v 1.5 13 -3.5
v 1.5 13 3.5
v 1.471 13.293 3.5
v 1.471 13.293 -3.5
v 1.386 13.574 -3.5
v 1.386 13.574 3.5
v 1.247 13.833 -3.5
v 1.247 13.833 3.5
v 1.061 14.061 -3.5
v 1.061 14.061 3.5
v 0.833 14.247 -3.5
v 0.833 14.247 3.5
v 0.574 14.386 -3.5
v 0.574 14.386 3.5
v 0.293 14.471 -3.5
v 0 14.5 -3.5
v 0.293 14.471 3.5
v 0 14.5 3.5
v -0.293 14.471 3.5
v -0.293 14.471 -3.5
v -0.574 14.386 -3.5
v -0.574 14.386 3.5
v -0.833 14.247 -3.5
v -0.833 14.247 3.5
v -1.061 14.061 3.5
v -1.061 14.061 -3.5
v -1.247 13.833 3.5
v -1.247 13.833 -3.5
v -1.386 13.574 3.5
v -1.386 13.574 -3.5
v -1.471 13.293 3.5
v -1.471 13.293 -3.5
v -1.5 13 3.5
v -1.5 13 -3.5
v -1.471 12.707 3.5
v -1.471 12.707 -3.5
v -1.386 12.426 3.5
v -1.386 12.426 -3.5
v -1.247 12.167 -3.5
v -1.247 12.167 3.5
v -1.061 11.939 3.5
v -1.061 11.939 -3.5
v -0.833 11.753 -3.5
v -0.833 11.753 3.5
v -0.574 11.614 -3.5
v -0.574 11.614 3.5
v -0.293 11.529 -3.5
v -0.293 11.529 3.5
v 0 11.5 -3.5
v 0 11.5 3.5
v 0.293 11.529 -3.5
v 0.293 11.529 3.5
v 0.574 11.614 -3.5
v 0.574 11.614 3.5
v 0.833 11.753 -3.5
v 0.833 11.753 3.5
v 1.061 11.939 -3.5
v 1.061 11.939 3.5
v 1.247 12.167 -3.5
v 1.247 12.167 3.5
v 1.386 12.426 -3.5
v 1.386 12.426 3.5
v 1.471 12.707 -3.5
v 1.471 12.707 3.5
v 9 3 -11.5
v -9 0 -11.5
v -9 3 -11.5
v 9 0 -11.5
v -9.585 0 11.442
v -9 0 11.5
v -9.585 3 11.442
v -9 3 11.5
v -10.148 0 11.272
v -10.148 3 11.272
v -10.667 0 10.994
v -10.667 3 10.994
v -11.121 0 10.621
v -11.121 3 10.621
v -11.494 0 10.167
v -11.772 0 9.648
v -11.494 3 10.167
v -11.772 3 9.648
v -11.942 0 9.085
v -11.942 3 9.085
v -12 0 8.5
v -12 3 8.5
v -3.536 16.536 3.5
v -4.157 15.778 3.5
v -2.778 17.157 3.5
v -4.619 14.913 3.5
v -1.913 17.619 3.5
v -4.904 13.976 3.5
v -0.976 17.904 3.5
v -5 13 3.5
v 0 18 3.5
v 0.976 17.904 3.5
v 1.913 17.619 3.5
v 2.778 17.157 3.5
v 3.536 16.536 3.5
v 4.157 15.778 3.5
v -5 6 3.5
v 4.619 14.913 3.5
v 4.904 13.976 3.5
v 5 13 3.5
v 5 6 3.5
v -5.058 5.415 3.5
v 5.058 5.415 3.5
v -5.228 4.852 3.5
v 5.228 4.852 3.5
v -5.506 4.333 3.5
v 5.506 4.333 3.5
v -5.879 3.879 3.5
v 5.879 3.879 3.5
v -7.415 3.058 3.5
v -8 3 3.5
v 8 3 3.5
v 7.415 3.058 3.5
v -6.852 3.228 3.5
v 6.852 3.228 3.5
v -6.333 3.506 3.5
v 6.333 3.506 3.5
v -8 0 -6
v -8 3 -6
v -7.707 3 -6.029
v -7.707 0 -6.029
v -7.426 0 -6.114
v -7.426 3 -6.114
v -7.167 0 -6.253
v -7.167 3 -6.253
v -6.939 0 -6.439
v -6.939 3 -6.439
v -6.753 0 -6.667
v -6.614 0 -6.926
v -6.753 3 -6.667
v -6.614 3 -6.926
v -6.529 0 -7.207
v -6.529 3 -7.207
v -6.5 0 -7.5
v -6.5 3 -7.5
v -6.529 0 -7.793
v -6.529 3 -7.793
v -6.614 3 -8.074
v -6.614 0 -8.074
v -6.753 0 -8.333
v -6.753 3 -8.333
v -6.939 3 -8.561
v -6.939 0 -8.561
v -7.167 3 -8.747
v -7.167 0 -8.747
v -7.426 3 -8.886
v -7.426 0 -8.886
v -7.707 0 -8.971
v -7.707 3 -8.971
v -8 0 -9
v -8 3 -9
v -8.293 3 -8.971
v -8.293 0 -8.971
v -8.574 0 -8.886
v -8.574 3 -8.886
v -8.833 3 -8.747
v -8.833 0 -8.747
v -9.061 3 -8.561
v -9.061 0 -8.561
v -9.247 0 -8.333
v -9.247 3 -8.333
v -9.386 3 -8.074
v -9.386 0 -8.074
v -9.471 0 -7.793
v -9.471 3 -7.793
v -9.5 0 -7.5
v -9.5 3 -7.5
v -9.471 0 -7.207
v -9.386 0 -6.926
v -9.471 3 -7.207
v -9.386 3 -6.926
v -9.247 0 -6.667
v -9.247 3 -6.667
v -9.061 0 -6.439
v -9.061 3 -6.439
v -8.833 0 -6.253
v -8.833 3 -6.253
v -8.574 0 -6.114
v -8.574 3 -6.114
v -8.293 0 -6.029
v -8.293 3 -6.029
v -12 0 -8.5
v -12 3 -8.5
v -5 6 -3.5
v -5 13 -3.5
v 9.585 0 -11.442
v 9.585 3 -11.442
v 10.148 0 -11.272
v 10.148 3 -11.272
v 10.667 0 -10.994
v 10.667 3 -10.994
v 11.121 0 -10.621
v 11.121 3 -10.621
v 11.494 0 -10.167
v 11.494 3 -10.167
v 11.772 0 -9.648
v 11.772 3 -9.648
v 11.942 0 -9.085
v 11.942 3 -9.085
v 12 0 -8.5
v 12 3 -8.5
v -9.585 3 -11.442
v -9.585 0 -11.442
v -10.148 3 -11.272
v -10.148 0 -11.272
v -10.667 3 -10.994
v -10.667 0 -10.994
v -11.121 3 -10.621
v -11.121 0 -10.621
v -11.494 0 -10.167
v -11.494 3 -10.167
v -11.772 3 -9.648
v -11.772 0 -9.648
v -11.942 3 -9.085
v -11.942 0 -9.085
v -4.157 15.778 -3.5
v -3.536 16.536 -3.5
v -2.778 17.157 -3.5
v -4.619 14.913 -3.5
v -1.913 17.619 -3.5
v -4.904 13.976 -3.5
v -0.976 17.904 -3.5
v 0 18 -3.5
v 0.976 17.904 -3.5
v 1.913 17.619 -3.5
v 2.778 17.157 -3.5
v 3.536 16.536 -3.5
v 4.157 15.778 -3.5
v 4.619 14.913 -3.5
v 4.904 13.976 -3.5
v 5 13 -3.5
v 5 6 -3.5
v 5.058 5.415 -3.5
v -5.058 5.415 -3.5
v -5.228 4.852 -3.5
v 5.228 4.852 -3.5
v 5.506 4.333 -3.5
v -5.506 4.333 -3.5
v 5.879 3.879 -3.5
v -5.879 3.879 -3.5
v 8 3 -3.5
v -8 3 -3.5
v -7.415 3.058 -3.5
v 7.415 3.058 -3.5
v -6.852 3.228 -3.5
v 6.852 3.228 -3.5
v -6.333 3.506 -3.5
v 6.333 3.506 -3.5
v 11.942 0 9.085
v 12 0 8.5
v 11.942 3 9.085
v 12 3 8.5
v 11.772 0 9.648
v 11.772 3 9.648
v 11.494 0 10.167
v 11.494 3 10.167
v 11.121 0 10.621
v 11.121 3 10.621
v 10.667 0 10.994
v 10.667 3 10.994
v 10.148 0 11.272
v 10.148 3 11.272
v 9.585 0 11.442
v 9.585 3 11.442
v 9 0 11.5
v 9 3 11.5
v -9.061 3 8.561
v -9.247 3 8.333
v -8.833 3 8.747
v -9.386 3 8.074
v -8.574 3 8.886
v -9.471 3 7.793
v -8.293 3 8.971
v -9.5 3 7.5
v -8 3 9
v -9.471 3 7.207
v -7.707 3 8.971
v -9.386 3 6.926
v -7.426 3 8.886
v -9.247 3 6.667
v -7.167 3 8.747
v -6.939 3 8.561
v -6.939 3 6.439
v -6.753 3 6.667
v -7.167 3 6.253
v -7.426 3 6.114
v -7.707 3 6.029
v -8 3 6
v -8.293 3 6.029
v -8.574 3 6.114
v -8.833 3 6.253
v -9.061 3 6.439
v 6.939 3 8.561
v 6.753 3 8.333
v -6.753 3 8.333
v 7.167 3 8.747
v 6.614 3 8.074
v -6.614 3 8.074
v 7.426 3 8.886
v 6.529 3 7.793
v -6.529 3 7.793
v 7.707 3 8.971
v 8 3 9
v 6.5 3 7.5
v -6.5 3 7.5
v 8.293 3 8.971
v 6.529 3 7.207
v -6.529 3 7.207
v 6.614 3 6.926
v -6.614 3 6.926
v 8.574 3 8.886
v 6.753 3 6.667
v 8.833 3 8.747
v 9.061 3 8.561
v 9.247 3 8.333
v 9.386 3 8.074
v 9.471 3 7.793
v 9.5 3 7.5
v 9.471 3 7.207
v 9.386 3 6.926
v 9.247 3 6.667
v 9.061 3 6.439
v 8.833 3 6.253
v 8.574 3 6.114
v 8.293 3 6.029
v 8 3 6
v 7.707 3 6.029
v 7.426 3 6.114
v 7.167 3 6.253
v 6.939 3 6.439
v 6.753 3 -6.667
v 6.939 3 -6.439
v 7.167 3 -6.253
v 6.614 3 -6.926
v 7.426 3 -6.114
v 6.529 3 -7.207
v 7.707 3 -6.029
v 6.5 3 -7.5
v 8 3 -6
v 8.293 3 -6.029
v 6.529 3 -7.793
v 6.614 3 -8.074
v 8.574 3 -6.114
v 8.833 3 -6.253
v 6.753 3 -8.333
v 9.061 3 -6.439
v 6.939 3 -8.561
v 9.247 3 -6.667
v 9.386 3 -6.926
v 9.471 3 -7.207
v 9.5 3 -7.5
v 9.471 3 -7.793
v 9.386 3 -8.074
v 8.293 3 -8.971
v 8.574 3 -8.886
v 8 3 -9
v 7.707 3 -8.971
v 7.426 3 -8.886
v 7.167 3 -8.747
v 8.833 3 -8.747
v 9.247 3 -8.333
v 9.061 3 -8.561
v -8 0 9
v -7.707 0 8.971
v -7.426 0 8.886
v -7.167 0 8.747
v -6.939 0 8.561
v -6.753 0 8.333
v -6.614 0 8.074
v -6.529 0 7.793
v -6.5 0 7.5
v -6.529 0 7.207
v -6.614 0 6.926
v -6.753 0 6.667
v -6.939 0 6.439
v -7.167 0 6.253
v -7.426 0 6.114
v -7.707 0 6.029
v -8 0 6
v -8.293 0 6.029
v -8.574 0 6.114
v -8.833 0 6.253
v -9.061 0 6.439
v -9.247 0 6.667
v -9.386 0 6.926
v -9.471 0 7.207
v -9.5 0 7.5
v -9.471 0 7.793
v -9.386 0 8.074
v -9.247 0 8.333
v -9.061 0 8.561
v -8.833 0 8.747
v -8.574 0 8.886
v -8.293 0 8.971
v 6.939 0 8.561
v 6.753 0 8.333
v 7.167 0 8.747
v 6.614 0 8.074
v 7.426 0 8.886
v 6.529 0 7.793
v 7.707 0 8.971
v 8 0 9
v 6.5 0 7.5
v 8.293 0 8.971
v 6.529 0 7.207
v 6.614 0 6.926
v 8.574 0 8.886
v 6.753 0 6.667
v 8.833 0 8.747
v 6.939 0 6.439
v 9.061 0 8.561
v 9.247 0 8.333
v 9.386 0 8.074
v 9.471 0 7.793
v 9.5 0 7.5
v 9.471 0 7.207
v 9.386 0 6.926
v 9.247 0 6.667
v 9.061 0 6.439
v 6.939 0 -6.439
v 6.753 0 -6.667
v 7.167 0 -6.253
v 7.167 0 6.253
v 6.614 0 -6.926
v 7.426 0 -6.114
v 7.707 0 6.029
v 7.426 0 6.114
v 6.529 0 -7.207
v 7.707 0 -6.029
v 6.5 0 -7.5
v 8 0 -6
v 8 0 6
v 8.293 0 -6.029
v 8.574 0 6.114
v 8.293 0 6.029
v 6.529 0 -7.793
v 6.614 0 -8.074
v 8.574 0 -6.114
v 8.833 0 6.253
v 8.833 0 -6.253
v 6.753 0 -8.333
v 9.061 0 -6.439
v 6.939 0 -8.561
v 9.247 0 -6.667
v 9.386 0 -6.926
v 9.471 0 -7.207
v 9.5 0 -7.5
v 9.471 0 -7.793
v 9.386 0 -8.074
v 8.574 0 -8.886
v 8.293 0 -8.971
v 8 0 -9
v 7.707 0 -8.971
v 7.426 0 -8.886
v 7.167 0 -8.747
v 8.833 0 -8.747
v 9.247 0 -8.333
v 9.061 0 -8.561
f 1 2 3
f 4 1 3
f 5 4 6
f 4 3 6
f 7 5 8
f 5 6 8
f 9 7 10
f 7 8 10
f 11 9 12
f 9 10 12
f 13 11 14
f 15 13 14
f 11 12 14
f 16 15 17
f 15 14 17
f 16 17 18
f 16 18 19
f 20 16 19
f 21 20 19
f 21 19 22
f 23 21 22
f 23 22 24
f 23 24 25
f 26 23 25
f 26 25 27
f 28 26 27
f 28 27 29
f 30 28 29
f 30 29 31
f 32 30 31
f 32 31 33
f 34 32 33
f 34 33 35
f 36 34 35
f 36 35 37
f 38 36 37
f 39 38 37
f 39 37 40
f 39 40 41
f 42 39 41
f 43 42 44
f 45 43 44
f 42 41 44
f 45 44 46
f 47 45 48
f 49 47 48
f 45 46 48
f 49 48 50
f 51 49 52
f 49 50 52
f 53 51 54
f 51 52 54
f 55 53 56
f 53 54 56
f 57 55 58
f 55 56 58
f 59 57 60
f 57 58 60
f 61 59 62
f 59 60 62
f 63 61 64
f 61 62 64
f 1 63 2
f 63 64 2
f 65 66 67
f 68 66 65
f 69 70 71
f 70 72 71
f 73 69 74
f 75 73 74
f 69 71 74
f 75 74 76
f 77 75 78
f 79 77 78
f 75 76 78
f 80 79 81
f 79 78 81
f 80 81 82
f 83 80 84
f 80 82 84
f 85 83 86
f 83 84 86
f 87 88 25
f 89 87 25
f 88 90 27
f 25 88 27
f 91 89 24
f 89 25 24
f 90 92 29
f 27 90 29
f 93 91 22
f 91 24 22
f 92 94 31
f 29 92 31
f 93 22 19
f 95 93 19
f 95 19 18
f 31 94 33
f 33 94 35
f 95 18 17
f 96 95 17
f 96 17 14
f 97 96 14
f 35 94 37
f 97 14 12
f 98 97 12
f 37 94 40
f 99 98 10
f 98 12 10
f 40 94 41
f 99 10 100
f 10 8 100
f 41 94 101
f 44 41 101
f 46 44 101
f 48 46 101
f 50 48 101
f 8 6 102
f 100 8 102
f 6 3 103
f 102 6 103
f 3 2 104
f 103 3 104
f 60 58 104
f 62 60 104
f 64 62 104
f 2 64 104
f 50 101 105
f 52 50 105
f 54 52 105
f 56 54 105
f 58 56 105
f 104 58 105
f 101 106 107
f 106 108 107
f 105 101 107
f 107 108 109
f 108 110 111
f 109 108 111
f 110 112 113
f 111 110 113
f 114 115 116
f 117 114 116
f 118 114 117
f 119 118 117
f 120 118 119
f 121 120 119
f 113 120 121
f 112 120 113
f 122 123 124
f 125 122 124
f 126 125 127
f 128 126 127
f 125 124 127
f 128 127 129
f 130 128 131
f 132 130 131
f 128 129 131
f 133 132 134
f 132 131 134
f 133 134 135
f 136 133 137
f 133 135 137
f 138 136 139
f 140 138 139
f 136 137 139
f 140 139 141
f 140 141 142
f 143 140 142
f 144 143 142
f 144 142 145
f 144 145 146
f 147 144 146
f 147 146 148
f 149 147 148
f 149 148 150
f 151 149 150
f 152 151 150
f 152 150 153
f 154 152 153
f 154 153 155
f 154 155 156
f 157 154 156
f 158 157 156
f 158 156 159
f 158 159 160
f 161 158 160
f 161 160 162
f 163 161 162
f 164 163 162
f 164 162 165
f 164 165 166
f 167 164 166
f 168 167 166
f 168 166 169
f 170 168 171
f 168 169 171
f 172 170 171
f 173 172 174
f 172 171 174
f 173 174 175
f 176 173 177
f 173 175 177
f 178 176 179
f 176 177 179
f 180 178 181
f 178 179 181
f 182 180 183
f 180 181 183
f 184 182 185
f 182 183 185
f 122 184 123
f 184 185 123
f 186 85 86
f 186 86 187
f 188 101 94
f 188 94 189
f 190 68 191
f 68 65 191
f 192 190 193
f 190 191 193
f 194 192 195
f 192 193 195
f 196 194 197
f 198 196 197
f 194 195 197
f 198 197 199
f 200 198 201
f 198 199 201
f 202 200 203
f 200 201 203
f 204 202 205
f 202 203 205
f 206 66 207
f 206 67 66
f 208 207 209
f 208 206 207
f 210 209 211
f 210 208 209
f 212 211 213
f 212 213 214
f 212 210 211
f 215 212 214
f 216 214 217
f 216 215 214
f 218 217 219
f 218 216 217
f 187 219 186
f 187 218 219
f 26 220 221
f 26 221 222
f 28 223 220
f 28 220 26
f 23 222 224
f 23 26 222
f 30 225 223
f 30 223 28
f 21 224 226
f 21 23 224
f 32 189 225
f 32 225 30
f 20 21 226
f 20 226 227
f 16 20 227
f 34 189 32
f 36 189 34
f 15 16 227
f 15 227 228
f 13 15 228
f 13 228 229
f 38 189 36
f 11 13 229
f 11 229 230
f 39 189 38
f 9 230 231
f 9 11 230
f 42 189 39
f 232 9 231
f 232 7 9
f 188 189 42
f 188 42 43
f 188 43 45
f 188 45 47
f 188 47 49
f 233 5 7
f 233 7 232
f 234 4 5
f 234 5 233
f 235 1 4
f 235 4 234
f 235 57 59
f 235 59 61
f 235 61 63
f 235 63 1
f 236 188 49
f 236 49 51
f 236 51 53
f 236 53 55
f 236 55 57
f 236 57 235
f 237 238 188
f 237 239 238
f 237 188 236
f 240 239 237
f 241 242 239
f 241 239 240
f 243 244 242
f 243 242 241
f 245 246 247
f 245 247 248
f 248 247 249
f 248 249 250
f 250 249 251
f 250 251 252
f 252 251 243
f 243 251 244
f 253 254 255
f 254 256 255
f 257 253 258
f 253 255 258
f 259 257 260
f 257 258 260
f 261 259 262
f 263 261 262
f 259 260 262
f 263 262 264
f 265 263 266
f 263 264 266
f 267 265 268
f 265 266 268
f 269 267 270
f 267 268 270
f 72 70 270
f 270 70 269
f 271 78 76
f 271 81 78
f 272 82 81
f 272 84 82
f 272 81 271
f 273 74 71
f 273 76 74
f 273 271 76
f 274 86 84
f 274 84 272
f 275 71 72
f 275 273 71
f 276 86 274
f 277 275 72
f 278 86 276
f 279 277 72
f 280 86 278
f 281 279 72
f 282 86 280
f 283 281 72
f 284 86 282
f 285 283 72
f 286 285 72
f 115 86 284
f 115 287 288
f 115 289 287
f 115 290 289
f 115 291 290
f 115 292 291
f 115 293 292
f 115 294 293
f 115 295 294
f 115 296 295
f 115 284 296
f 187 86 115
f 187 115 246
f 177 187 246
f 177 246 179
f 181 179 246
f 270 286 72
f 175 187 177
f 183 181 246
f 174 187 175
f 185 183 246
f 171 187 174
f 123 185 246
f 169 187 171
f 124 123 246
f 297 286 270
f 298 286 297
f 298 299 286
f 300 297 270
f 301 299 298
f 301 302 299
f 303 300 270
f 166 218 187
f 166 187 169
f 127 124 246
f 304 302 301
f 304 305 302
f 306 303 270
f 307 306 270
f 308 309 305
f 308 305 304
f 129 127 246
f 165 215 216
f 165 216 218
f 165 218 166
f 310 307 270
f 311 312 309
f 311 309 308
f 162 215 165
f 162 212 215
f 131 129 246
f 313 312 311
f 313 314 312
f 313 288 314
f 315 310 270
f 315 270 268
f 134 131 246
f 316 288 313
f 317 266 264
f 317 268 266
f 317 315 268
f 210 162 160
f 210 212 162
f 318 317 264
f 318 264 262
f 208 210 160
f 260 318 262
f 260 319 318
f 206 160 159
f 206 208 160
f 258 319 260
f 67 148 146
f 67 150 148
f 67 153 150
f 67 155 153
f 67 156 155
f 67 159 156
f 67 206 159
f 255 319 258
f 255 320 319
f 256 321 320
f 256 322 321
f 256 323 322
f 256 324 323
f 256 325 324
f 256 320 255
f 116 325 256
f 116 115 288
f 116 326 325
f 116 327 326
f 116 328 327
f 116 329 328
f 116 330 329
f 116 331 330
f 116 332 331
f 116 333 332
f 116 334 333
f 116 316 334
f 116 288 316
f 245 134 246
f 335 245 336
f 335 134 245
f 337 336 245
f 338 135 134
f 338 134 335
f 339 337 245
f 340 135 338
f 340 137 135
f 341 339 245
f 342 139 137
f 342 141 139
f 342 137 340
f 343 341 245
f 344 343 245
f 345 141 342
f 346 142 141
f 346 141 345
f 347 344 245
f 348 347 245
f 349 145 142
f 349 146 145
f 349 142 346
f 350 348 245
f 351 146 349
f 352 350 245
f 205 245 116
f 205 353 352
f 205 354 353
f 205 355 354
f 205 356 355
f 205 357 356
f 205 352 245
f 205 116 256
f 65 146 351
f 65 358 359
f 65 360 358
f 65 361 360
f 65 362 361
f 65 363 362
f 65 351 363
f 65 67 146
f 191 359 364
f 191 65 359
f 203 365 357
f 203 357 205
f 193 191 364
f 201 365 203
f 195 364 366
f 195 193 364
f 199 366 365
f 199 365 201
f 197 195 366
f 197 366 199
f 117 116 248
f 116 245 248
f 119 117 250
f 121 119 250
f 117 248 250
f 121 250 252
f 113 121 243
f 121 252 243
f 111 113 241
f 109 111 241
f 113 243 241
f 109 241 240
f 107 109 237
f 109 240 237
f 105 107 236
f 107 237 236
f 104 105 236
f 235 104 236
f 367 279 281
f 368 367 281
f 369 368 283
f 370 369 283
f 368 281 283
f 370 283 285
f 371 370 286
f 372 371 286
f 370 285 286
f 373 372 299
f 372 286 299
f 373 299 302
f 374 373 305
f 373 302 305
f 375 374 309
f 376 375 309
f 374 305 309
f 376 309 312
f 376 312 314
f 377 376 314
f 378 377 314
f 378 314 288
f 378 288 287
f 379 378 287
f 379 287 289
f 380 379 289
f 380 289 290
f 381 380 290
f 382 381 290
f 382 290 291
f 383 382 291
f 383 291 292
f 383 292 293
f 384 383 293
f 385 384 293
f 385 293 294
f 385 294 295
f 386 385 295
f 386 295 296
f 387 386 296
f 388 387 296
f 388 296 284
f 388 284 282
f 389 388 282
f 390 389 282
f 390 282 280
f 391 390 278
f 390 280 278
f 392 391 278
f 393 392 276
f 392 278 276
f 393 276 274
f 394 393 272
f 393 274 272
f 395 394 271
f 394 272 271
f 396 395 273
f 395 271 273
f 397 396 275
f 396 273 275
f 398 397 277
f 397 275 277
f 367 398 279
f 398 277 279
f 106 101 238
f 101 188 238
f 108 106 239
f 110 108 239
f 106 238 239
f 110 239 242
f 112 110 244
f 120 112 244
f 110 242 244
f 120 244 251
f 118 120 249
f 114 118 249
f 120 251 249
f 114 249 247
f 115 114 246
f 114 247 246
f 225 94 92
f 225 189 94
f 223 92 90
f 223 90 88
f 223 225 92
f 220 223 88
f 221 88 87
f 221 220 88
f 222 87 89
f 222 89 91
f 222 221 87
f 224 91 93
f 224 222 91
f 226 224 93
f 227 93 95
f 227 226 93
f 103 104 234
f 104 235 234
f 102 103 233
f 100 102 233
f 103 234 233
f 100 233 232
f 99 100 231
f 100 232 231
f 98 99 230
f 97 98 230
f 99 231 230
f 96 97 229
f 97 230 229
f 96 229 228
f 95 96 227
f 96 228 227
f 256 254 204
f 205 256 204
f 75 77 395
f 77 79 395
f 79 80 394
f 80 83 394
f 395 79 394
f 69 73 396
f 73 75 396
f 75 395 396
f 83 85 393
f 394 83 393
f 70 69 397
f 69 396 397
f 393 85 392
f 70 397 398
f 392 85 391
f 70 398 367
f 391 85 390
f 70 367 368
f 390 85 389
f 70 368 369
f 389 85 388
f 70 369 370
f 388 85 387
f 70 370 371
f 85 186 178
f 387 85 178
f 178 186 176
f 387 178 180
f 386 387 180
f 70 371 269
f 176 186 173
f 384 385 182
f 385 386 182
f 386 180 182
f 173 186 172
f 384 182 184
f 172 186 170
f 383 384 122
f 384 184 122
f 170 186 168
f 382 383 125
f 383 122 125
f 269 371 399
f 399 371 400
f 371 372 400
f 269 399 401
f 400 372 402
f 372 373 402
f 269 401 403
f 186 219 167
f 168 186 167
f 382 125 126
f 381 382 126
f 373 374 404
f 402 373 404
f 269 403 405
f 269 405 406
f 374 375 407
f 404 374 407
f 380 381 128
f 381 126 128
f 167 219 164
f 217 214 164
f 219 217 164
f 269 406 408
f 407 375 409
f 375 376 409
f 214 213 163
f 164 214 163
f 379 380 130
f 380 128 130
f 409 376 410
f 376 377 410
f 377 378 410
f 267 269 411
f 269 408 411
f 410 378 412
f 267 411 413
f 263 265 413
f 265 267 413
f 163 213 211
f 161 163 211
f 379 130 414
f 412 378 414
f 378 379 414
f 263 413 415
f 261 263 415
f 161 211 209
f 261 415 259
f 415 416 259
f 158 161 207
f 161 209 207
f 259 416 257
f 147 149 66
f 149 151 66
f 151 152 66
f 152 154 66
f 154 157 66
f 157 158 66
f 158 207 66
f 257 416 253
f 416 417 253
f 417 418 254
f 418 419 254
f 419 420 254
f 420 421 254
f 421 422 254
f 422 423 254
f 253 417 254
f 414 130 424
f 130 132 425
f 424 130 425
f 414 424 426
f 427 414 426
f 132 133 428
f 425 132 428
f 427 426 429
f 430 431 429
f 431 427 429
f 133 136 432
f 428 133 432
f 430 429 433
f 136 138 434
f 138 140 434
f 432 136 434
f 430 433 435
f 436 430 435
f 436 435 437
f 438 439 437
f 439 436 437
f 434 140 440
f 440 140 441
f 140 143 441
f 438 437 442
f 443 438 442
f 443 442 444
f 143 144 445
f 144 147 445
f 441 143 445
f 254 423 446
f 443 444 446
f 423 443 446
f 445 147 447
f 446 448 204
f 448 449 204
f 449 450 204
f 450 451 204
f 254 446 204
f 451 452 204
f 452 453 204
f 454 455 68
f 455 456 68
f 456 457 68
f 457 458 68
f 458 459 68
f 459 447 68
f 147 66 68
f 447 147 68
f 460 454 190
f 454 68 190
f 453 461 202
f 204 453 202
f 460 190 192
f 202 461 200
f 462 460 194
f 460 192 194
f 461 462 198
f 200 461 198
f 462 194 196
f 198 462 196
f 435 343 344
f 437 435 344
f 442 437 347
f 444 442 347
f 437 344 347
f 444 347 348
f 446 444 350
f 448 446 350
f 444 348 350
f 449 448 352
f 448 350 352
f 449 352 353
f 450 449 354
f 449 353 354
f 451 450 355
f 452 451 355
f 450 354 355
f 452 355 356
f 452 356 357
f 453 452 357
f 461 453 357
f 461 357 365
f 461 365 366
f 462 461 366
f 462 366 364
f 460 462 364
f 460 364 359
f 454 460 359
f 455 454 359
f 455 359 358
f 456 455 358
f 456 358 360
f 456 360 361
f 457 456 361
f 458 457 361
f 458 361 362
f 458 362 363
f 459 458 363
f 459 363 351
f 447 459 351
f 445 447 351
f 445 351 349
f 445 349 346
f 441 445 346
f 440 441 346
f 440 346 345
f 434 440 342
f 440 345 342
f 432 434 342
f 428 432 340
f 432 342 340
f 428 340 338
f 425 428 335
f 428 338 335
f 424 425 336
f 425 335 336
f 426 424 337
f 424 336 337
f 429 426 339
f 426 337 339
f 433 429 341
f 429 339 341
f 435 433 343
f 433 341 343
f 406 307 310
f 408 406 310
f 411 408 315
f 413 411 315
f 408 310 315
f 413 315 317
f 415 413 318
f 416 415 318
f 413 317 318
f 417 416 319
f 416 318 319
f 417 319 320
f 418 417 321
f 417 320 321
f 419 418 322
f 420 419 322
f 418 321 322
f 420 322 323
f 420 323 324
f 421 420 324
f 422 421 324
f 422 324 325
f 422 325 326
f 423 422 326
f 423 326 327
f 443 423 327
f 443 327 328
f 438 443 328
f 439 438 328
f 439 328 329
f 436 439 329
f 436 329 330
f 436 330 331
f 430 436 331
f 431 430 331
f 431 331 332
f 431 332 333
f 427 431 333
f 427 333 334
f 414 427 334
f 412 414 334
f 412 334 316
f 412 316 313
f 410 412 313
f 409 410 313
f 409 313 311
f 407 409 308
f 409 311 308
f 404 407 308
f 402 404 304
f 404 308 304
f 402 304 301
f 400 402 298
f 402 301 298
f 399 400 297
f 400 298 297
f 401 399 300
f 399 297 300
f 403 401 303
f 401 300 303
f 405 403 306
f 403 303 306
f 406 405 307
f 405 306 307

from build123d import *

# Parameters (mm, degrees)
SKETCH_1_W          = 24
SKETCH_1_H          = 23
EXTRUDE_1_DEPTH     = 3
SKETCH_2_W          = 10
SKETCH_2_H          = 7
EXTRUDE_2_DEPTH     = 15
SKETCH_3_R          = 1.5
CUT_EXTRUDE_2_DEPTH = 27.324893162
SKETCH_4_R          = 1.5
CUT_EXTRUDE_3_DEPTH = 23.388613177
FILLET_1_R          = 5
FILLET_2_R          = 3
FILLET_3_R          = 3


with BuildPart() as part:
    # 草图1 → 凸台-拉伸1 (new body)
    with BuildSketch(Plane(origin=(0, 0, 0), x_dir=(1, 0, 0), z_dir=(0, 1, 0))):
        Rectangle(SKETCH_1_W, SKETCH_1_H)
    extrude(amount=EXTRUDE_1_DEPTH)

    # 草图2 → 凸台-拉伸2 (add)
    with BuildSketch(Plane(origin=(0, 3, 0), x_dir=(1, 0, 0), z_dir=(0, 1, 0))):
        Rectangle(SKETCH_2_W, SKETCH_2_H)
    extrude(amount=EXTRUDE_2_DEPTH)

    # 草图3 → 切除-拉伸2 (cut, through all)
    with BuildSketch(Plane.XY.offset(3.5)):
        with Locations((0, 13)):
            Circle(SKETCH_3_R)
    extrude(amount=-CUT_EXTRUDE_2_DEPTH, mode=Mode.SUBTRACT)

    # 草图4 → 切除-拉伸3 (cut, through all)
    with BuildSketch(Plane(origin=(0, 3, 0), x_dir=(1, 0, 0), z_dir=(0, 1, 0))):
        with Locations(Location((-8, 7.5, 0), (0, 0, 270))):
            Circle(SKETCH_4_R)
        with Locations(Location((-8, -7.5, 0), (0, 0, 270))):
            Circle(SKETCH_4_R)
        with Locations(Location((8, -7.5, 0), (0, 0, 270))):
            Circle(SKETCH_4_R)
        with Locations(Location((8, 7.5, 0), (0, 0, 270))):
            Circle(SKETCH_4_R)
    extrude(amount=-CUT_EXTRUDE_3_DEPTH, mode=Mode.SUBTRACT)

    # 圆角1
    fillet_1_edges = [part.edges().sort_by_distance(p)[0] for p in [
        (-5, 18, 0),
        (5, 18, 0),
    ]]
    fillet(fillet_1_edges, radius=FILLET_1_R - 0.0001)  # a hair under: the kernel refuses the full size

    # 圆角2
    fillet_2_edges = [part.edges().sort_by_distance(p)[0] for p in [
        (5, 3, 0),
        (-5, 3, 0),
    ]]
    fillet(fillet_2_edges, radius=FILLET_2_R)

    # 圆角3
    fillet_3_edges = [part.edges().sort_by_distance(p)[0] for p in [
        (12, 1.5, 11.5),
        (-12, 1.5, 11.5),
        (-12, 1.5, -11.5),
        (12, 1.5, -11.5),
    ]]
    fillet(fillet_3_edges, radius=FILLET_3_R)


solid = part.part
